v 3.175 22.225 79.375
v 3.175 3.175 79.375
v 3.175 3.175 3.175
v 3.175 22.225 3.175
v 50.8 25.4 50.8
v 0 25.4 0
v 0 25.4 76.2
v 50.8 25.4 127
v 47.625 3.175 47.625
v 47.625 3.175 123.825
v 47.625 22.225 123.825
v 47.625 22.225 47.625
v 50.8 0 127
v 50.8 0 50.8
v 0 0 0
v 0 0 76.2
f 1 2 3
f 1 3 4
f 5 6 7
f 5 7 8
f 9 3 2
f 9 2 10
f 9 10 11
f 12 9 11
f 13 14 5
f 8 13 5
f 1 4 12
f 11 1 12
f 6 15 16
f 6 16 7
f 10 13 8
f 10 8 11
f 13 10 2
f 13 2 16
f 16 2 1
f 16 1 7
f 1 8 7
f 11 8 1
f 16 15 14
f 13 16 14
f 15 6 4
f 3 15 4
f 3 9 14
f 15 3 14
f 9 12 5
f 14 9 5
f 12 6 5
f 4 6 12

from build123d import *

# Parameters (mm, degrees)
SKETCH1_W           = 50.8
SKETCH1_H           = 25.4
SKETCH1_W_2         = 44.45
SKETCH1_H_2         = 19.05
BOSS_EXTRUDE1_DEPTH = 127
CUT_EXTRUDE1_DEPTH  = 127


with BuildPart() as part:
    # Sketch1 → Boss-Extrude1 (new body)
    with BuildSketch(Plane.XY):
        with Locations((25.4, 12.7)):
            Rectangle(SKETCH1_W, SKETCH1_H)
        with Locations((25.4, 12.7)):
            Rectangle(SKETCH1_W_2, SKETCH1_H_2, mode=Mode.SUBTRACT)
    extrude(amount=BOSS_EXTRUDE1_DEPTH)

    # Sketch2 → Cut-Extrude1 (cut)
    with BuildSketch(Plane(origin=(0, 25.4, 0), x_dir=(1, 0, 0), z_dir=(0, 1, 0))):
        Polygon((0, 0), (50.8, -50.8), (50.8, 0), align=None)
        Polygon((0, -76.2), (0, -127), (50.8, -127), align=None)
    extrude(amount=-CUT_EXTRUDE1_DEPTH, mode=Mode.SUBTRACT)


solid = part.part
